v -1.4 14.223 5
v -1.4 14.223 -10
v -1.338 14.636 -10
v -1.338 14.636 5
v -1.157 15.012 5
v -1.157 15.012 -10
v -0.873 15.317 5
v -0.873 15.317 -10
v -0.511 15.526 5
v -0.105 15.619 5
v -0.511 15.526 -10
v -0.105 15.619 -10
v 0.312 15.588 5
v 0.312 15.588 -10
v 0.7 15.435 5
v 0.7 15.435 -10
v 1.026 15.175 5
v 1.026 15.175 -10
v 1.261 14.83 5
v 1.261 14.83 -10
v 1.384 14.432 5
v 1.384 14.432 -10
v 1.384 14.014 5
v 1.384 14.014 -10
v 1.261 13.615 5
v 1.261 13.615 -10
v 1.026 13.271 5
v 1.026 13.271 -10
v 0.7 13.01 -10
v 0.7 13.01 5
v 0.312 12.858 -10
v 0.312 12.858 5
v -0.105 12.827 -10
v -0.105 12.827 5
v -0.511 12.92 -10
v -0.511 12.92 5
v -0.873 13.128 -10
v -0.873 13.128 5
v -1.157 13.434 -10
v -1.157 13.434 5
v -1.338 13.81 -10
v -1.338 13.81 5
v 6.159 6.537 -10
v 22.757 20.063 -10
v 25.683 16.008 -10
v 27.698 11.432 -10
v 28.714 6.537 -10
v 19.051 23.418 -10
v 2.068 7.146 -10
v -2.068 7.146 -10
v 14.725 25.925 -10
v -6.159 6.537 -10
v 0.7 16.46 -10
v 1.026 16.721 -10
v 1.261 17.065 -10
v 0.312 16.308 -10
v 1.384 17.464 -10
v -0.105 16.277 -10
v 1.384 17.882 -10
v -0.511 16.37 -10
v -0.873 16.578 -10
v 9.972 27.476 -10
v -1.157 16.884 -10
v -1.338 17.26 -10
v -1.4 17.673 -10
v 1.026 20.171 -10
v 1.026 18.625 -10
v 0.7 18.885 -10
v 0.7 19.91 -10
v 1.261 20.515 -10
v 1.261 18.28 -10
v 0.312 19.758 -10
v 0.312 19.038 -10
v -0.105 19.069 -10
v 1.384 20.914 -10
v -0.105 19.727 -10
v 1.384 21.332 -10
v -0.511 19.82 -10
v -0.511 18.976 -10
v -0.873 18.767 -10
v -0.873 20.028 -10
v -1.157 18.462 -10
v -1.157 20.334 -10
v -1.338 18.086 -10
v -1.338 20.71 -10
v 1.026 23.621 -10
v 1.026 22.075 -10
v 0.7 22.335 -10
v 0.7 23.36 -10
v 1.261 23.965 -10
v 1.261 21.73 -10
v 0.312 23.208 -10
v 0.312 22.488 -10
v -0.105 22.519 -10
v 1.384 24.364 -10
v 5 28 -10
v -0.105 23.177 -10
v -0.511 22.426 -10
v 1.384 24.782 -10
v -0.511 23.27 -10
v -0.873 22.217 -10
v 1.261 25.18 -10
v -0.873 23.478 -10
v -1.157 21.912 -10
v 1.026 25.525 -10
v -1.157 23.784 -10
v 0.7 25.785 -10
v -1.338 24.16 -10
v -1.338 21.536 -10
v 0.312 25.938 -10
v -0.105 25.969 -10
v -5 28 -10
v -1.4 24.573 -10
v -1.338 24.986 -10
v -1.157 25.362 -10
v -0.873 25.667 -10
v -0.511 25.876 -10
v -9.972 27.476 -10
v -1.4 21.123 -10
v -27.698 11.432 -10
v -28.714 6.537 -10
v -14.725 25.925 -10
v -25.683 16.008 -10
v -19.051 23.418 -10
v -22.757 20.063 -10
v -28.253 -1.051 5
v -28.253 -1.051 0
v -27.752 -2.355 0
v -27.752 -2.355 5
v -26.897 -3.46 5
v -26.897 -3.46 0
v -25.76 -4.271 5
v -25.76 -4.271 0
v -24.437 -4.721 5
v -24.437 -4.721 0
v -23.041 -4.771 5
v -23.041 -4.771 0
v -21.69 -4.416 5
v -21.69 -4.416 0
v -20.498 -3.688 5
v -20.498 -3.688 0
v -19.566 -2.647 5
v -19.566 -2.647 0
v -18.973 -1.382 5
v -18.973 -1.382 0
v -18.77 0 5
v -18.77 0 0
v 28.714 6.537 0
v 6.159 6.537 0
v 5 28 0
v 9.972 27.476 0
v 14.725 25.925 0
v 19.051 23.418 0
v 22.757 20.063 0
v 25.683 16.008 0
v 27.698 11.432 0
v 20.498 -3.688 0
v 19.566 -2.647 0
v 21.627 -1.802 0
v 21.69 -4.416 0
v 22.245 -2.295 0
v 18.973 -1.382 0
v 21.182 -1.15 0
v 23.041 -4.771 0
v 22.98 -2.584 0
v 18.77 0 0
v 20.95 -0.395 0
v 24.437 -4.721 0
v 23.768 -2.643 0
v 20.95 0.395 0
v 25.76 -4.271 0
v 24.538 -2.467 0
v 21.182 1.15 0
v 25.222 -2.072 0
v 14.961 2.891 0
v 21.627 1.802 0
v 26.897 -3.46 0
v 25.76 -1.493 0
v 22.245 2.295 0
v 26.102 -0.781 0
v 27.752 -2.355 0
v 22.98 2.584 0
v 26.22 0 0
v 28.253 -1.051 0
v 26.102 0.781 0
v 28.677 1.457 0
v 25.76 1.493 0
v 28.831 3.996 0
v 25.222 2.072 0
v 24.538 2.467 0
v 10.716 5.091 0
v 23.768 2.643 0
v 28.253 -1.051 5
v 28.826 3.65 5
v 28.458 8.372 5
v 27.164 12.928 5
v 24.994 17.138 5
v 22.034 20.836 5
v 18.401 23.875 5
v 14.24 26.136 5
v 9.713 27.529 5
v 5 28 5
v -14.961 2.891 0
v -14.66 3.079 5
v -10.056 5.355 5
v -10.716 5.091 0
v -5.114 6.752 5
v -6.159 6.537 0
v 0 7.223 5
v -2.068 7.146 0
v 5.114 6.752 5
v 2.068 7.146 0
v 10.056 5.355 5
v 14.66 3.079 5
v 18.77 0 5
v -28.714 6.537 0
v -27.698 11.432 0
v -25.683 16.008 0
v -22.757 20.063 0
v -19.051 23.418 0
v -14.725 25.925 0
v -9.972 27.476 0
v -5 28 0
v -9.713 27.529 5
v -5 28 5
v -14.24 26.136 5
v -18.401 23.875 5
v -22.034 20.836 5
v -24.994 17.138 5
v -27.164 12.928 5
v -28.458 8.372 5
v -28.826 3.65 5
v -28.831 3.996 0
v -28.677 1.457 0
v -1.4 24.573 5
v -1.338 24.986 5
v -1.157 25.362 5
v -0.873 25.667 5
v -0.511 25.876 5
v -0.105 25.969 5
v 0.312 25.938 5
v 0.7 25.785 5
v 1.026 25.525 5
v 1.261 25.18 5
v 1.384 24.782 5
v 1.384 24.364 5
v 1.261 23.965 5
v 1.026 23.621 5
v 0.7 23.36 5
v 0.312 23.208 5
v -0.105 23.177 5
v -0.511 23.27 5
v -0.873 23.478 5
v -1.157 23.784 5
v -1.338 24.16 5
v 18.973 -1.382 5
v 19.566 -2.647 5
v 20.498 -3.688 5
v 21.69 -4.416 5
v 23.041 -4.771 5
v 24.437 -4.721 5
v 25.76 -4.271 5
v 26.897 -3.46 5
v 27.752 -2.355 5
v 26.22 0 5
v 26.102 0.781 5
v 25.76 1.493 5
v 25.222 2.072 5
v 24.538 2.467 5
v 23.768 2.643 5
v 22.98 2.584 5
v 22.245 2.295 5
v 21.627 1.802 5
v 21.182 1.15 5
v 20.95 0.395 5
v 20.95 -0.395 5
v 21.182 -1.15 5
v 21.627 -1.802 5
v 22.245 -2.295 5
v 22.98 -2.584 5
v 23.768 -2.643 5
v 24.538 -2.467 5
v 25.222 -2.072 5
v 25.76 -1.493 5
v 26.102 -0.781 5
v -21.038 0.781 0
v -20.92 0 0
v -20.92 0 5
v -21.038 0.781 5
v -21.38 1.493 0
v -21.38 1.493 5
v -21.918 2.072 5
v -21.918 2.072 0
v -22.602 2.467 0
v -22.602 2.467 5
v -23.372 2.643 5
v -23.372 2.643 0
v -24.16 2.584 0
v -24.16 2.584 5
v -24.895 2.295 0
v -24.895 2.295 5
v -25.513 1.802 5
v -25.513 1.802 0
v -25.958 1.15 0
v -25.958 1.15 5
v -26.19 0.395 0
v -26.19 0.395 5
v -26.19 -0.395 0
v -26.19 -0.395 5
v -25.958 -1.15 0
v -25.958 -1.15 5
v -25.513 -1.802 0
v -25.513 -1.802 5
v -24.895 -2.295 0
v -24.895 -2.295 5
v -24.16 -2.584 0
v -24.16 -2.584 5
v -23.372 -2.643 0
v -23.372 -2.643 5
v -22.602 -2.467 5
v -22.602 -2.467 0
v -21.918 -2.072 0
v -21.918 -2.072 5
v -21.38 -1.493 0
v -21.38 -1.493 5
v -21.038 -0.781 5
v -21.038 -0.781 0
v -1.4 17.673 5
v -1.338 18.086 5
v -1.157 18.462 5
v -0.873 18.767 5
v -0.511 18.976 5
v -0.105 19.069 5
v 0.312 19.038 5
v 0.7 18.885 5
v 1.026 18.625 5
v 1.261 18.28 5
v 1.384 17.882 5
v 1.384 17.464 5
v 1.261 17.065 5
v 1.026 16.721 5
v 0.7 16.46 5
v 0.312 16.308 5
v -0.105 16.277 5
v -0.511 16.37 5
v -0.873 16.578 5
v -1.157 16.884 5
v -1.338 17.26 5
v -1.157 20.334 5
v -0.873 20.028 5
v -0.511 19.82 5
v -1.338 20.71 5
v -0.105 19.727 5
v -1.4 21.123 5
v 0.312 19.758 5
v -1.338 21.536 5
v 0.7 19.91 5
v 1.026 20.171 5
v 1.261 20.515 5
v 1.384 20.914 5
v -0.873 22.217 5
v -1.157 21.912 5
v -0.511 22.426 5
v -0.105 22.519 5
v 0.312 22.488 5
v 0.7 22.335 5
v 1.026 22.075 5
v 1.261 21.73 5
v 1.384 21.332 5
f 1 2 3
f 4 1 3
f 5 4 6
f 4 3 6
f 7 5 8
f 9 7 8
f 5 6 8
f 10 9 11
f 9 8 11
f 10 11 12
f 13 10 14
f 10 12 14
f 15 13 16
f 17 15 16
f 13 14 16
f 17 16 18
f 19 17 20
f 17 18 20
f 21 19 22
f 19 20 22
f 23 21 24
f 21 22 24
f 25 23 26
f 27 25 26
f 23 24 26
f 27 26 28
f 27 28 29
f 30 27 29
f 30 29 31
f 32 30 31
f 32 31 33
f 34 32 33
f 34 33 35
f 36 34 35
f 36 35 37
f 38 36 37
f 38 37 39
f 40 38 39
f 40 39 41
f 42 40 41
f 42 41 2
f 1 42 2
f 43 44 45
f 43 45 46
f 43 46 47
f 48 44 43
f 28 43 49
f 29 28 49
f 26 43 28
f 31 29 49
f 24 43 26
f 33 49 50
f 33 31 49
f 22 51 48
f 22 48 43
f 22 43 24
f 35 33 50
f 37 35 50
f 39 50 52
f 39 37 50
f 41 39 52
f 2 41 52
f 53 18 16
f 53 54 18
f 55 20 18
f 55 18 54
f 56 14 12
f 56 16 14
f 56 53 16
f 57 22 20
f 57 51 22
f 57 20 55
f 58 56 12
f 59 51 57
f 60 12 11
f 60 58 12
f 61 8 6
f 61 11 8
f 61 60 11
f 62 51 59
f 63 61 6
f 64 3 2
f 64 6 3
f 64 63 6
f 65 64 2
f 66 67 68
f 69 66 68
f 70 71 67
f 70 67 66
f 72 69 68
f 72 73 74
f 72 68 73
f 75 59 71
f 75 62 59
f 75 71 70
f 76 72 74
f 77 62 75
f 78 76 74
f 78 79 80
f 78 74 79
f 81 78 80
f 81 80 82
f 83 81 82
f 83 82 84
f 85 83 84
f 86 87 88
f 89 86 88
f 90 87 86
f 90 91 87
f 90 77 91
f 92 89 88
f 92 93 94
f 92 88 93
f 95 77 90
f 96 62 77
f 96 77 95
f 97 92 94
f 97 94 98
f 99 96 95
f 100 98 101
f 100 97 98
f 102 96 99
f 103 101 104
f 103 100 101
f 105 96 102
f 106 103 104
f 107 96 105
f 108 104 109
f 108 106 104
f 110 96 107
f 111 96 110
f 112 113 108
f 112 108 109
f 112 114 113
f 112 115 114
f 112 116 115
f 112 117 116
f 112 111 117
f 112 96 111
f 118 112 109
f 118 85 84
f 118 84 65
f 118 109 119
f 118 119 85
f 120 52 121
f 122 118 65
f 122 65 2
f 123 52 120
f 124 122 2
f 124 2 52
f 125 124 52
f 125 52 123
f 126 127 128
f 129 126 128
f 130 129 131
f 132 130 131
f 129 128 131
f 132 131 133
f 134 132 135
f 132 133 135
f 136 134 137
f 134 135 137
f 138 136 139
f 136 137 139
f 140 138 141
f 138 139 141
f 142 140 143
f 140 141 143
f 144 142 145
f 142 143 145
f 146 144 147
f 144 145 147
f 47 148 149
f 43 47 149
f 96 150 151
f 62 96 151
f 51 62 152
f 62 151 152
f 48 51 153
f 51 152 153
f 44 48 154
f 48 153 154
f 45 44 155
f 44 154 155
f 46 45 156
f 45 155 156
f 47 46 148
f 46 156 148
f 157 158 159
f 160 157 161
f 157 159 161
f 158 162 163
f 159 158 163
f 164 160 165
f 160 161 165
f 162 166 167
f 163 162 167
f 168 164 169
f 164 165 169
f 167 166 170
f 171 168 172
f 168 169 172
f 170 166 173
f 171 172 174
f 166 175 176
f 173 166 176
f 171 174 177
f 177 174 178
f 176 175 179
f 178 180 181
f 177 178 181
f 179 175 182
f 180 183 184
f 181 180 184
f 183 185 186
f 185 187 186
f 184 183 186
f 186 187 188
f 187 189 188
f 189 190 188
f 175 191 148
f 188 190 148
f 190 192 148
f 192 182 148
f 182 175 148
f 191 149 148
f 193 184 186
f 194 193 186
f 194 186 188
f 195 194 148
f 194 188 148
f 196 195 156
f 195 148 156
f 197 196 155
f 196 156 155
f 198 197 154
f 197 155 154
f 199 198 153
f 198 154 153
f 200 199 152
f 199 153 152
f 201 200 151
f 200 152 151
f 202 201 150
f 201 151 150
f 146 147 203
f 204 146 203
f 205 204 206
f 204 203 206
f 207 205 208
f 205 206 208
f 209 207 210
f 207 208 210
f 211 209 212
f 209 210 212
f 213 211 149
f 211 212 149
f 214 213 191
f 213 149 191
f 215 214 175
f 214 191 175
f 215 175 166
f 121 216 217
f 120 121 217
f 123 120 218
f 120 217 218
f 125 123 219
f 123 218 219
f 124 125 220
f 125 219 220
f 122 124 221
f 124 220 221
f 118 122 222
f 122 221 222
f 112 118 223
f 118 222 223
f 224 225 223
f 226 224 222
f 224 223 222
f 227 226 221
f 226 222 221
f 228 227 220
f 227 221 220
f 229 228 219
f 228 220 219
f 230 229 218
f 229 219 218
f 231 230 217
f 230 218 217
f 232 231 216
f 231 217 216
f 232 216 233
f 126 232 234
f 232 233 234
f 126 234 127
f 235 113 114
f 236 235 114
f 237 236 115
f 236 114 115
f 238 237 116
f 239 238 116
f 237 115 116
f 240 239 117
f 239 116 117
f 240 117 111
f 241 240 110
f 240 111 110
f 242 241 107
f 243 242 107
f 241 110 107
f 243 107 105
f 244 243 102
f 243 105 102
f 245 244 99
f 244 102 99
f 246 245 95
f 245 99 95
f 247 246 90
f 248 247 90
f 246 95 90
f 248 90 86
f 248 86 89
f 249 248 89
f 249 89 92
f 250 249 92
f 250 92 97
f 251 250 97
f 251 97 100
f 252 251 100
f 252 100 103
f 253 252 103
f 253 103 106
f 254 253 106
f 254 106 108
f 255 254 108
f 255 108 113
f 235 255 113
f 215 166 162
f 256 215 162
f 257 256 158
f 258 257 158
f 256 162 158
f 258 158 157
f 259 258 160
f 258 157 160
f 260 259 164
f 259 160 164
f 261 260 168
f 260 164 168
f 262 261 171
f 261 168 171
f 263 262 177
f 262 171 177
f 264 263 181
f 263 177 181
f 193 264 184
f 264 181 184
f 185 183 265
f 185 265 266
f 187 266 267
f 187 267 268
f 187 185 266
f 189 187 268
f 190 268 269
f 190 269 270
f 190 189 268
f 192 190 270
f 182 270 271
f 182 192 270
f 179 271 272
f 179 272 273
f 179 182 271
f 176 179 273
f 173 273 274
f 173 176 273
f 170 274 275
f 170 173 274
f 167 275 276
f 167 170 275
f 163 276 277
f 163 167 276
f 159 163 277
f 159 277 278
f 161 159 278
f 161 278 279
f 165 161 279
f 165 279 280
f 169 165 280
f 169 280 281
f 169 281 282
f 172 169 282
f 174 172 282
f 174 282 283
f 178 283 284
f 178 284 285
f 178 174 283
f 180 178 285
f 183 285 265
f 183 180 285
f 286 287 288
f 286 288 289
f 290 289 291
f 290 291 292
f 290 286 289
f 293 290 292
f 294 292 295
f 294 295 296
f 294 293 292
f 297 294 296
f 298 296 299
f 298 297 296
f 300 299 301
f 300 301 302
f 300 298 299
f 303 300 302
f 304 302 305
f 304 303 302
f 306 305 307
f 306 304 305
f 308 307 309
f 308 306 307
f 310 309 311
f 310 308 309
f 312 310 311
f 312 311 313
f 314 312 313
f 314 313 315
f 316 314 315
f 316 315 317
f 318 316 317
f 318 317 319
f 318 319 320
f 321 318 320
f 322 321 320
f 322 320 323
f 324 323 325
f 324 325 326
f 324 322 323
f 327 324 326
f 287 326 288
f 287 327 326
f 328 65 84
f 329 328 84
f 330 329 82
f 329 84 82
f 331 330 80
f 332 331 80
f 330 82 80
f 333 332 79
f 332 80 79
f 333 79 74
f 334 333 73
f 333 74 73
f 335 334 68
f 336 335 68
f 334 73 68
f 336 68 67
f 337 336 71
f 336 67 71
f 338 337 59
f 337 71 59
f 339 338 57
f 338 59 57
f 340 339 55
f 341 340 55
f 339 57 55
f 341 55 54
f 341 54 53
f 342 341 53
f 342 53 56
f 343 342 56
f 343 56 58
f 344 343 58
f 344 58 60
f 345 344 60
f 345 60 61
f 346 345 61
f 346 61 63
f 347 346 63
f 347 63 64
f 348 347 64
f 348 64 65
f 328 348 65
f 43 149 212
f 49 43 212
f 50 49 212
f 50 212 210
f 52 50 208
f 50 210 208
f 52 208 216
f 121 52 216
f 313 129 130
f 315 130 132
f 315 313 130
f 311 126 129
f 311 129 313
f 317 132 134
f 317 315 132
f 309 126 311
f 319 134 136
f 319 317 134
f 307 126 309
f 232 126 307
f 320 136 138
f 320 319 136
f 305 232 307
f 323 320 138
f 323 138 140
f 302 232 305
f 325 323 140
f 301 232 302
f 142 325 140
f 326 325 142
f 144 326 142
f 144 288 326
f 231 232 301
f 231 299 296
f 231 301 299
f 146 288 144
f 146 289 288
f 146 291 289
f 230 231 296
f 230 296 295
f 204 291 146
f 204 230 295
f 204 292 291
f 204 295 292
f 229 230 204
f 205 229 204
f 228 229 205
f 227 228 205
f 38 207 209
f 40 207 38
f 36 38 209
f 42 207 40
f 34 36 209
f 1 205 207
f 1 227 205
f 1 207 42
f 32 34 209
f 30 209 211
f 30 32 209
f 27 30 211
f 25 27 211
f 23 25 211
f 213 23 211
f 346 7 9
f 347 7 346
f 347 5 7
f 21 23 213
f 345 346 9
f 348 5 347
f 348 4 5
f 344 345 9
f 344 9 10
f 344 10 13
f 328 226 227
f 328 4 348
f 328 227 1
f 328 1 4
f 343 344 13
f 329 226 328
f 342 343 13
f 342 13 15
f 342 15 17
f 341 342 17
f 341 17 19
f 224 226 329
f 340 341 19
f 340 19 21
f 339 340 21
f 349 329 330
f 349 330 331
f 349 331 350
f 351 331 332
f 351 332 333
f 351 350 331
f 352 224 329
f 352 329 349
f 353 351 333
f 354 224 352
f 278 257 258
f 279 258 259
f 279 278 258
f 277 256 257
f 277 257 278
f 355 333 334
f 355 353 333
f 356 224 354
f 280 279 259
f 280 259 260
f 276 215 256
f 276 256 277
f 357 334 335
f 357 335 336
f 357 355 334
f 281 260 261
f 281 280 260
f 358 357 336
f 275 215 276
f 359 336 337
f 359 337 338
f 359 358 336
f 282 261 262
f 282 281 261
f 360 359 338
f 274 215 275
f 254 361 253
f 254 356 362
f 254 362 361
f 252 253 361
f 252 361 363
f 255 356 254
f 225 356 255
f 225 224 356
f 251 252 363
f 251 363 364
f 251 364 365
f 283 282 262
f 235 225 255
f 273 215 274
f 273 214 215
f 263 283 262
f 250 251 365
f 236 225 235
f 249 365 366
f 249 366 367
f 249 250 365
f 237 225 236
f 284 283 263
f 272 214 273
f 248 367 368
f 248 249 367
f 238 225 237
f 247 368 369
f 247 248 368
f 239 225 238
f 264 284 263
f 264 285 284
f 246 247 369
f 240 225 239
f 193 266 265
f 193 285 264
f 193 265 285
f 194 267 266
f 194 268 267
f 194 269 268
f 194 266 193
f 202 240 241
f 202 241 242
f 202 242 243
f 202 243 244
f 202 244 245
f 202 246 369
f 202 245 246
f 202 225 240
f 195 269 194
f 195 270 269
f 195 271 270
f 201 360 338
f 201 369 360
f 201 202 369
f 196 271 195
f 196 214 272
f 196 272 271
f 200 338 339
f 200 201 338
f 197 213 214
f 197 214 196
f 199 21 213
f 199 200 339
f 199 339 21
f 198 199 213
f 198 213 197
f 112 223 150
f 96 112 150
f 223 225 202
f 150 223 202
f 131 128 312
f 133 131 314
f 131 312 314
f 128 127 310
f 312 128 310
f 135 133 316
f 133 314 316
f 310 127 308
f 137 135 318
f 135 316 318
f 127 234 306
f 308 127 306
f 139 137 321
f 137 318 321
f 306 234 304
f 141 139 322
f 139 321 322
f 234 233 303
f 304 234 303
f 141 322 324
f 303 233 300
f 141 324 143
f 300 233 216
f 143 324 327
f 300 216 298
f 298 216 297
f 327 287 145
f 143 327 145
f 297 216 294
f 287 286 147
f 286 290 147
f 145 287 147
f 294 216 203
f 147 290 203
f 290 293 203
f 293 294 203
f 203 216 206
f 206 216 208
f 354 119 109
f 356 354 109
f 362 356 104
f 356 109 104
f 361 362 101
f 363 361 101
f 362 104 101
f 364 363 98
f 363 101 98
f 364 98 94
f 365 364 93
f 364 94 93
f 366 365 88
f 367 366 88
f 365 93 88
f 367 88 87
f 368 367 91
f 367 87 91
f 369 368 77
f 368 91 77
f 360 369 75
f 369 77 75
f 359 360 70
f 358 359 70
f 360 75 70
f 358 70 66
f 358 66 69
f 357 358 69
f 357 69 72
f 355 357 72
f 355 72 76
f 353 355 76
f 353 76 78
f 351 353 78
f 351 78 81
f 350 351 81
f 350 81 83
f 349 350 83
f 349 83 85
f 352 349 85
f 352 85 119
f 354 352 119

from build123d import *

# Parameters (mm, degrees)
SKETCH1_R           = 2.65
BOSS_EXTRUDE1_DEPTH = 5
BOSS_EXTRUDE2_DEPTH = 10
SKETCH3_R           = 1.4
CUT_EXTRUDE1_DEPTH  = 16


with BuildPart() as part:
    # Sketch1 → Boss-Extrude1 (new body)
    with BuildSketch(Plane.XY):
        with BuildLine():
            Line((5, 28), (-5, 28))
            ThreePointArc((-5, 28), (-23.605754448, 19.060621125), (-28.253479924, -1.05119732))
            ThreePointArc((-28.253479924, -1.05119732), (-23.041182278, -4.770781049), (-18.77, 0))
            ThreePointArc((-18.77, 0), (0, 7.222918877), (18.77, 0))
            ThreePointArc((18.77, 0), (23.041182278, -4.770781049), (28.253479924, -1.05119732))
            ThreePointArc((28.253479924, -1.05119732), (23.605754448, 19.060621125), (5, 28))
        make_face()
        with Locations((-23.57, 0)):
            Circle(SKETCH1_R, mode=Mode.SUBTRACT)
        with Locations((23.57, 0)):
            Circle(SKETCH1_R, mode=Mode.SUBTRACT)
    extrude(amount=BOSS_EXTRUDE1_DEPTH)

    # Sketch2 → Boss-Extrude2 (add)
    with BuildSketch(Plane(origin=(0, 0, 0), x_dir=(-1, 0, 0), z_dir=(0, 0, -1))):
        with BuildLine():
            Line((-28.713948761, 6.537166667), (-6.158885262, 6.537166667))
            ThreePointArc((-6.158885262, 6.537166667), (0, 7.222918877), (6.158885262, 6.537166667))
            Line((6.158885262, 6.537166667), (28.713948761, 6.537166667))
            ThreePointArc((28.713948761, 6.537166667), (20.992221394, 21.837553063), (5, 28))
            Line((5, 28), (-5, 28))
            ThreePointArc((-5, 28), (-20.992221394, 21.837553063), (-28.713948761, 6.537166667))
        make_face()
    extrude(amount=BOSS_EXTRUDE2_DEPTH)

    # Sketch3 → Cut-Extrude1 (cut, through all)
    with BuildSketch(Plane(origin=(0, 0, -10), x_dir=(-1, 0, 0), z_dir=(0, 0, -1))):
        with Locations((0, 24.572918877)):
            Circle(SKETCH3_R)
        with Locations((0, 21.122918877)):
            Circle(SKETCH3_R)
        with Locations((0, 17.672918877)):
            Circle(SKETCH3_R)
        with Locations((0, 14.222918877)):
            Circle(SKETCH3_R)
    extrude(amount=-CUT_EXTRUDE1_DEPTH, mode=Mode.SUBTRACT)


solid = part.part
